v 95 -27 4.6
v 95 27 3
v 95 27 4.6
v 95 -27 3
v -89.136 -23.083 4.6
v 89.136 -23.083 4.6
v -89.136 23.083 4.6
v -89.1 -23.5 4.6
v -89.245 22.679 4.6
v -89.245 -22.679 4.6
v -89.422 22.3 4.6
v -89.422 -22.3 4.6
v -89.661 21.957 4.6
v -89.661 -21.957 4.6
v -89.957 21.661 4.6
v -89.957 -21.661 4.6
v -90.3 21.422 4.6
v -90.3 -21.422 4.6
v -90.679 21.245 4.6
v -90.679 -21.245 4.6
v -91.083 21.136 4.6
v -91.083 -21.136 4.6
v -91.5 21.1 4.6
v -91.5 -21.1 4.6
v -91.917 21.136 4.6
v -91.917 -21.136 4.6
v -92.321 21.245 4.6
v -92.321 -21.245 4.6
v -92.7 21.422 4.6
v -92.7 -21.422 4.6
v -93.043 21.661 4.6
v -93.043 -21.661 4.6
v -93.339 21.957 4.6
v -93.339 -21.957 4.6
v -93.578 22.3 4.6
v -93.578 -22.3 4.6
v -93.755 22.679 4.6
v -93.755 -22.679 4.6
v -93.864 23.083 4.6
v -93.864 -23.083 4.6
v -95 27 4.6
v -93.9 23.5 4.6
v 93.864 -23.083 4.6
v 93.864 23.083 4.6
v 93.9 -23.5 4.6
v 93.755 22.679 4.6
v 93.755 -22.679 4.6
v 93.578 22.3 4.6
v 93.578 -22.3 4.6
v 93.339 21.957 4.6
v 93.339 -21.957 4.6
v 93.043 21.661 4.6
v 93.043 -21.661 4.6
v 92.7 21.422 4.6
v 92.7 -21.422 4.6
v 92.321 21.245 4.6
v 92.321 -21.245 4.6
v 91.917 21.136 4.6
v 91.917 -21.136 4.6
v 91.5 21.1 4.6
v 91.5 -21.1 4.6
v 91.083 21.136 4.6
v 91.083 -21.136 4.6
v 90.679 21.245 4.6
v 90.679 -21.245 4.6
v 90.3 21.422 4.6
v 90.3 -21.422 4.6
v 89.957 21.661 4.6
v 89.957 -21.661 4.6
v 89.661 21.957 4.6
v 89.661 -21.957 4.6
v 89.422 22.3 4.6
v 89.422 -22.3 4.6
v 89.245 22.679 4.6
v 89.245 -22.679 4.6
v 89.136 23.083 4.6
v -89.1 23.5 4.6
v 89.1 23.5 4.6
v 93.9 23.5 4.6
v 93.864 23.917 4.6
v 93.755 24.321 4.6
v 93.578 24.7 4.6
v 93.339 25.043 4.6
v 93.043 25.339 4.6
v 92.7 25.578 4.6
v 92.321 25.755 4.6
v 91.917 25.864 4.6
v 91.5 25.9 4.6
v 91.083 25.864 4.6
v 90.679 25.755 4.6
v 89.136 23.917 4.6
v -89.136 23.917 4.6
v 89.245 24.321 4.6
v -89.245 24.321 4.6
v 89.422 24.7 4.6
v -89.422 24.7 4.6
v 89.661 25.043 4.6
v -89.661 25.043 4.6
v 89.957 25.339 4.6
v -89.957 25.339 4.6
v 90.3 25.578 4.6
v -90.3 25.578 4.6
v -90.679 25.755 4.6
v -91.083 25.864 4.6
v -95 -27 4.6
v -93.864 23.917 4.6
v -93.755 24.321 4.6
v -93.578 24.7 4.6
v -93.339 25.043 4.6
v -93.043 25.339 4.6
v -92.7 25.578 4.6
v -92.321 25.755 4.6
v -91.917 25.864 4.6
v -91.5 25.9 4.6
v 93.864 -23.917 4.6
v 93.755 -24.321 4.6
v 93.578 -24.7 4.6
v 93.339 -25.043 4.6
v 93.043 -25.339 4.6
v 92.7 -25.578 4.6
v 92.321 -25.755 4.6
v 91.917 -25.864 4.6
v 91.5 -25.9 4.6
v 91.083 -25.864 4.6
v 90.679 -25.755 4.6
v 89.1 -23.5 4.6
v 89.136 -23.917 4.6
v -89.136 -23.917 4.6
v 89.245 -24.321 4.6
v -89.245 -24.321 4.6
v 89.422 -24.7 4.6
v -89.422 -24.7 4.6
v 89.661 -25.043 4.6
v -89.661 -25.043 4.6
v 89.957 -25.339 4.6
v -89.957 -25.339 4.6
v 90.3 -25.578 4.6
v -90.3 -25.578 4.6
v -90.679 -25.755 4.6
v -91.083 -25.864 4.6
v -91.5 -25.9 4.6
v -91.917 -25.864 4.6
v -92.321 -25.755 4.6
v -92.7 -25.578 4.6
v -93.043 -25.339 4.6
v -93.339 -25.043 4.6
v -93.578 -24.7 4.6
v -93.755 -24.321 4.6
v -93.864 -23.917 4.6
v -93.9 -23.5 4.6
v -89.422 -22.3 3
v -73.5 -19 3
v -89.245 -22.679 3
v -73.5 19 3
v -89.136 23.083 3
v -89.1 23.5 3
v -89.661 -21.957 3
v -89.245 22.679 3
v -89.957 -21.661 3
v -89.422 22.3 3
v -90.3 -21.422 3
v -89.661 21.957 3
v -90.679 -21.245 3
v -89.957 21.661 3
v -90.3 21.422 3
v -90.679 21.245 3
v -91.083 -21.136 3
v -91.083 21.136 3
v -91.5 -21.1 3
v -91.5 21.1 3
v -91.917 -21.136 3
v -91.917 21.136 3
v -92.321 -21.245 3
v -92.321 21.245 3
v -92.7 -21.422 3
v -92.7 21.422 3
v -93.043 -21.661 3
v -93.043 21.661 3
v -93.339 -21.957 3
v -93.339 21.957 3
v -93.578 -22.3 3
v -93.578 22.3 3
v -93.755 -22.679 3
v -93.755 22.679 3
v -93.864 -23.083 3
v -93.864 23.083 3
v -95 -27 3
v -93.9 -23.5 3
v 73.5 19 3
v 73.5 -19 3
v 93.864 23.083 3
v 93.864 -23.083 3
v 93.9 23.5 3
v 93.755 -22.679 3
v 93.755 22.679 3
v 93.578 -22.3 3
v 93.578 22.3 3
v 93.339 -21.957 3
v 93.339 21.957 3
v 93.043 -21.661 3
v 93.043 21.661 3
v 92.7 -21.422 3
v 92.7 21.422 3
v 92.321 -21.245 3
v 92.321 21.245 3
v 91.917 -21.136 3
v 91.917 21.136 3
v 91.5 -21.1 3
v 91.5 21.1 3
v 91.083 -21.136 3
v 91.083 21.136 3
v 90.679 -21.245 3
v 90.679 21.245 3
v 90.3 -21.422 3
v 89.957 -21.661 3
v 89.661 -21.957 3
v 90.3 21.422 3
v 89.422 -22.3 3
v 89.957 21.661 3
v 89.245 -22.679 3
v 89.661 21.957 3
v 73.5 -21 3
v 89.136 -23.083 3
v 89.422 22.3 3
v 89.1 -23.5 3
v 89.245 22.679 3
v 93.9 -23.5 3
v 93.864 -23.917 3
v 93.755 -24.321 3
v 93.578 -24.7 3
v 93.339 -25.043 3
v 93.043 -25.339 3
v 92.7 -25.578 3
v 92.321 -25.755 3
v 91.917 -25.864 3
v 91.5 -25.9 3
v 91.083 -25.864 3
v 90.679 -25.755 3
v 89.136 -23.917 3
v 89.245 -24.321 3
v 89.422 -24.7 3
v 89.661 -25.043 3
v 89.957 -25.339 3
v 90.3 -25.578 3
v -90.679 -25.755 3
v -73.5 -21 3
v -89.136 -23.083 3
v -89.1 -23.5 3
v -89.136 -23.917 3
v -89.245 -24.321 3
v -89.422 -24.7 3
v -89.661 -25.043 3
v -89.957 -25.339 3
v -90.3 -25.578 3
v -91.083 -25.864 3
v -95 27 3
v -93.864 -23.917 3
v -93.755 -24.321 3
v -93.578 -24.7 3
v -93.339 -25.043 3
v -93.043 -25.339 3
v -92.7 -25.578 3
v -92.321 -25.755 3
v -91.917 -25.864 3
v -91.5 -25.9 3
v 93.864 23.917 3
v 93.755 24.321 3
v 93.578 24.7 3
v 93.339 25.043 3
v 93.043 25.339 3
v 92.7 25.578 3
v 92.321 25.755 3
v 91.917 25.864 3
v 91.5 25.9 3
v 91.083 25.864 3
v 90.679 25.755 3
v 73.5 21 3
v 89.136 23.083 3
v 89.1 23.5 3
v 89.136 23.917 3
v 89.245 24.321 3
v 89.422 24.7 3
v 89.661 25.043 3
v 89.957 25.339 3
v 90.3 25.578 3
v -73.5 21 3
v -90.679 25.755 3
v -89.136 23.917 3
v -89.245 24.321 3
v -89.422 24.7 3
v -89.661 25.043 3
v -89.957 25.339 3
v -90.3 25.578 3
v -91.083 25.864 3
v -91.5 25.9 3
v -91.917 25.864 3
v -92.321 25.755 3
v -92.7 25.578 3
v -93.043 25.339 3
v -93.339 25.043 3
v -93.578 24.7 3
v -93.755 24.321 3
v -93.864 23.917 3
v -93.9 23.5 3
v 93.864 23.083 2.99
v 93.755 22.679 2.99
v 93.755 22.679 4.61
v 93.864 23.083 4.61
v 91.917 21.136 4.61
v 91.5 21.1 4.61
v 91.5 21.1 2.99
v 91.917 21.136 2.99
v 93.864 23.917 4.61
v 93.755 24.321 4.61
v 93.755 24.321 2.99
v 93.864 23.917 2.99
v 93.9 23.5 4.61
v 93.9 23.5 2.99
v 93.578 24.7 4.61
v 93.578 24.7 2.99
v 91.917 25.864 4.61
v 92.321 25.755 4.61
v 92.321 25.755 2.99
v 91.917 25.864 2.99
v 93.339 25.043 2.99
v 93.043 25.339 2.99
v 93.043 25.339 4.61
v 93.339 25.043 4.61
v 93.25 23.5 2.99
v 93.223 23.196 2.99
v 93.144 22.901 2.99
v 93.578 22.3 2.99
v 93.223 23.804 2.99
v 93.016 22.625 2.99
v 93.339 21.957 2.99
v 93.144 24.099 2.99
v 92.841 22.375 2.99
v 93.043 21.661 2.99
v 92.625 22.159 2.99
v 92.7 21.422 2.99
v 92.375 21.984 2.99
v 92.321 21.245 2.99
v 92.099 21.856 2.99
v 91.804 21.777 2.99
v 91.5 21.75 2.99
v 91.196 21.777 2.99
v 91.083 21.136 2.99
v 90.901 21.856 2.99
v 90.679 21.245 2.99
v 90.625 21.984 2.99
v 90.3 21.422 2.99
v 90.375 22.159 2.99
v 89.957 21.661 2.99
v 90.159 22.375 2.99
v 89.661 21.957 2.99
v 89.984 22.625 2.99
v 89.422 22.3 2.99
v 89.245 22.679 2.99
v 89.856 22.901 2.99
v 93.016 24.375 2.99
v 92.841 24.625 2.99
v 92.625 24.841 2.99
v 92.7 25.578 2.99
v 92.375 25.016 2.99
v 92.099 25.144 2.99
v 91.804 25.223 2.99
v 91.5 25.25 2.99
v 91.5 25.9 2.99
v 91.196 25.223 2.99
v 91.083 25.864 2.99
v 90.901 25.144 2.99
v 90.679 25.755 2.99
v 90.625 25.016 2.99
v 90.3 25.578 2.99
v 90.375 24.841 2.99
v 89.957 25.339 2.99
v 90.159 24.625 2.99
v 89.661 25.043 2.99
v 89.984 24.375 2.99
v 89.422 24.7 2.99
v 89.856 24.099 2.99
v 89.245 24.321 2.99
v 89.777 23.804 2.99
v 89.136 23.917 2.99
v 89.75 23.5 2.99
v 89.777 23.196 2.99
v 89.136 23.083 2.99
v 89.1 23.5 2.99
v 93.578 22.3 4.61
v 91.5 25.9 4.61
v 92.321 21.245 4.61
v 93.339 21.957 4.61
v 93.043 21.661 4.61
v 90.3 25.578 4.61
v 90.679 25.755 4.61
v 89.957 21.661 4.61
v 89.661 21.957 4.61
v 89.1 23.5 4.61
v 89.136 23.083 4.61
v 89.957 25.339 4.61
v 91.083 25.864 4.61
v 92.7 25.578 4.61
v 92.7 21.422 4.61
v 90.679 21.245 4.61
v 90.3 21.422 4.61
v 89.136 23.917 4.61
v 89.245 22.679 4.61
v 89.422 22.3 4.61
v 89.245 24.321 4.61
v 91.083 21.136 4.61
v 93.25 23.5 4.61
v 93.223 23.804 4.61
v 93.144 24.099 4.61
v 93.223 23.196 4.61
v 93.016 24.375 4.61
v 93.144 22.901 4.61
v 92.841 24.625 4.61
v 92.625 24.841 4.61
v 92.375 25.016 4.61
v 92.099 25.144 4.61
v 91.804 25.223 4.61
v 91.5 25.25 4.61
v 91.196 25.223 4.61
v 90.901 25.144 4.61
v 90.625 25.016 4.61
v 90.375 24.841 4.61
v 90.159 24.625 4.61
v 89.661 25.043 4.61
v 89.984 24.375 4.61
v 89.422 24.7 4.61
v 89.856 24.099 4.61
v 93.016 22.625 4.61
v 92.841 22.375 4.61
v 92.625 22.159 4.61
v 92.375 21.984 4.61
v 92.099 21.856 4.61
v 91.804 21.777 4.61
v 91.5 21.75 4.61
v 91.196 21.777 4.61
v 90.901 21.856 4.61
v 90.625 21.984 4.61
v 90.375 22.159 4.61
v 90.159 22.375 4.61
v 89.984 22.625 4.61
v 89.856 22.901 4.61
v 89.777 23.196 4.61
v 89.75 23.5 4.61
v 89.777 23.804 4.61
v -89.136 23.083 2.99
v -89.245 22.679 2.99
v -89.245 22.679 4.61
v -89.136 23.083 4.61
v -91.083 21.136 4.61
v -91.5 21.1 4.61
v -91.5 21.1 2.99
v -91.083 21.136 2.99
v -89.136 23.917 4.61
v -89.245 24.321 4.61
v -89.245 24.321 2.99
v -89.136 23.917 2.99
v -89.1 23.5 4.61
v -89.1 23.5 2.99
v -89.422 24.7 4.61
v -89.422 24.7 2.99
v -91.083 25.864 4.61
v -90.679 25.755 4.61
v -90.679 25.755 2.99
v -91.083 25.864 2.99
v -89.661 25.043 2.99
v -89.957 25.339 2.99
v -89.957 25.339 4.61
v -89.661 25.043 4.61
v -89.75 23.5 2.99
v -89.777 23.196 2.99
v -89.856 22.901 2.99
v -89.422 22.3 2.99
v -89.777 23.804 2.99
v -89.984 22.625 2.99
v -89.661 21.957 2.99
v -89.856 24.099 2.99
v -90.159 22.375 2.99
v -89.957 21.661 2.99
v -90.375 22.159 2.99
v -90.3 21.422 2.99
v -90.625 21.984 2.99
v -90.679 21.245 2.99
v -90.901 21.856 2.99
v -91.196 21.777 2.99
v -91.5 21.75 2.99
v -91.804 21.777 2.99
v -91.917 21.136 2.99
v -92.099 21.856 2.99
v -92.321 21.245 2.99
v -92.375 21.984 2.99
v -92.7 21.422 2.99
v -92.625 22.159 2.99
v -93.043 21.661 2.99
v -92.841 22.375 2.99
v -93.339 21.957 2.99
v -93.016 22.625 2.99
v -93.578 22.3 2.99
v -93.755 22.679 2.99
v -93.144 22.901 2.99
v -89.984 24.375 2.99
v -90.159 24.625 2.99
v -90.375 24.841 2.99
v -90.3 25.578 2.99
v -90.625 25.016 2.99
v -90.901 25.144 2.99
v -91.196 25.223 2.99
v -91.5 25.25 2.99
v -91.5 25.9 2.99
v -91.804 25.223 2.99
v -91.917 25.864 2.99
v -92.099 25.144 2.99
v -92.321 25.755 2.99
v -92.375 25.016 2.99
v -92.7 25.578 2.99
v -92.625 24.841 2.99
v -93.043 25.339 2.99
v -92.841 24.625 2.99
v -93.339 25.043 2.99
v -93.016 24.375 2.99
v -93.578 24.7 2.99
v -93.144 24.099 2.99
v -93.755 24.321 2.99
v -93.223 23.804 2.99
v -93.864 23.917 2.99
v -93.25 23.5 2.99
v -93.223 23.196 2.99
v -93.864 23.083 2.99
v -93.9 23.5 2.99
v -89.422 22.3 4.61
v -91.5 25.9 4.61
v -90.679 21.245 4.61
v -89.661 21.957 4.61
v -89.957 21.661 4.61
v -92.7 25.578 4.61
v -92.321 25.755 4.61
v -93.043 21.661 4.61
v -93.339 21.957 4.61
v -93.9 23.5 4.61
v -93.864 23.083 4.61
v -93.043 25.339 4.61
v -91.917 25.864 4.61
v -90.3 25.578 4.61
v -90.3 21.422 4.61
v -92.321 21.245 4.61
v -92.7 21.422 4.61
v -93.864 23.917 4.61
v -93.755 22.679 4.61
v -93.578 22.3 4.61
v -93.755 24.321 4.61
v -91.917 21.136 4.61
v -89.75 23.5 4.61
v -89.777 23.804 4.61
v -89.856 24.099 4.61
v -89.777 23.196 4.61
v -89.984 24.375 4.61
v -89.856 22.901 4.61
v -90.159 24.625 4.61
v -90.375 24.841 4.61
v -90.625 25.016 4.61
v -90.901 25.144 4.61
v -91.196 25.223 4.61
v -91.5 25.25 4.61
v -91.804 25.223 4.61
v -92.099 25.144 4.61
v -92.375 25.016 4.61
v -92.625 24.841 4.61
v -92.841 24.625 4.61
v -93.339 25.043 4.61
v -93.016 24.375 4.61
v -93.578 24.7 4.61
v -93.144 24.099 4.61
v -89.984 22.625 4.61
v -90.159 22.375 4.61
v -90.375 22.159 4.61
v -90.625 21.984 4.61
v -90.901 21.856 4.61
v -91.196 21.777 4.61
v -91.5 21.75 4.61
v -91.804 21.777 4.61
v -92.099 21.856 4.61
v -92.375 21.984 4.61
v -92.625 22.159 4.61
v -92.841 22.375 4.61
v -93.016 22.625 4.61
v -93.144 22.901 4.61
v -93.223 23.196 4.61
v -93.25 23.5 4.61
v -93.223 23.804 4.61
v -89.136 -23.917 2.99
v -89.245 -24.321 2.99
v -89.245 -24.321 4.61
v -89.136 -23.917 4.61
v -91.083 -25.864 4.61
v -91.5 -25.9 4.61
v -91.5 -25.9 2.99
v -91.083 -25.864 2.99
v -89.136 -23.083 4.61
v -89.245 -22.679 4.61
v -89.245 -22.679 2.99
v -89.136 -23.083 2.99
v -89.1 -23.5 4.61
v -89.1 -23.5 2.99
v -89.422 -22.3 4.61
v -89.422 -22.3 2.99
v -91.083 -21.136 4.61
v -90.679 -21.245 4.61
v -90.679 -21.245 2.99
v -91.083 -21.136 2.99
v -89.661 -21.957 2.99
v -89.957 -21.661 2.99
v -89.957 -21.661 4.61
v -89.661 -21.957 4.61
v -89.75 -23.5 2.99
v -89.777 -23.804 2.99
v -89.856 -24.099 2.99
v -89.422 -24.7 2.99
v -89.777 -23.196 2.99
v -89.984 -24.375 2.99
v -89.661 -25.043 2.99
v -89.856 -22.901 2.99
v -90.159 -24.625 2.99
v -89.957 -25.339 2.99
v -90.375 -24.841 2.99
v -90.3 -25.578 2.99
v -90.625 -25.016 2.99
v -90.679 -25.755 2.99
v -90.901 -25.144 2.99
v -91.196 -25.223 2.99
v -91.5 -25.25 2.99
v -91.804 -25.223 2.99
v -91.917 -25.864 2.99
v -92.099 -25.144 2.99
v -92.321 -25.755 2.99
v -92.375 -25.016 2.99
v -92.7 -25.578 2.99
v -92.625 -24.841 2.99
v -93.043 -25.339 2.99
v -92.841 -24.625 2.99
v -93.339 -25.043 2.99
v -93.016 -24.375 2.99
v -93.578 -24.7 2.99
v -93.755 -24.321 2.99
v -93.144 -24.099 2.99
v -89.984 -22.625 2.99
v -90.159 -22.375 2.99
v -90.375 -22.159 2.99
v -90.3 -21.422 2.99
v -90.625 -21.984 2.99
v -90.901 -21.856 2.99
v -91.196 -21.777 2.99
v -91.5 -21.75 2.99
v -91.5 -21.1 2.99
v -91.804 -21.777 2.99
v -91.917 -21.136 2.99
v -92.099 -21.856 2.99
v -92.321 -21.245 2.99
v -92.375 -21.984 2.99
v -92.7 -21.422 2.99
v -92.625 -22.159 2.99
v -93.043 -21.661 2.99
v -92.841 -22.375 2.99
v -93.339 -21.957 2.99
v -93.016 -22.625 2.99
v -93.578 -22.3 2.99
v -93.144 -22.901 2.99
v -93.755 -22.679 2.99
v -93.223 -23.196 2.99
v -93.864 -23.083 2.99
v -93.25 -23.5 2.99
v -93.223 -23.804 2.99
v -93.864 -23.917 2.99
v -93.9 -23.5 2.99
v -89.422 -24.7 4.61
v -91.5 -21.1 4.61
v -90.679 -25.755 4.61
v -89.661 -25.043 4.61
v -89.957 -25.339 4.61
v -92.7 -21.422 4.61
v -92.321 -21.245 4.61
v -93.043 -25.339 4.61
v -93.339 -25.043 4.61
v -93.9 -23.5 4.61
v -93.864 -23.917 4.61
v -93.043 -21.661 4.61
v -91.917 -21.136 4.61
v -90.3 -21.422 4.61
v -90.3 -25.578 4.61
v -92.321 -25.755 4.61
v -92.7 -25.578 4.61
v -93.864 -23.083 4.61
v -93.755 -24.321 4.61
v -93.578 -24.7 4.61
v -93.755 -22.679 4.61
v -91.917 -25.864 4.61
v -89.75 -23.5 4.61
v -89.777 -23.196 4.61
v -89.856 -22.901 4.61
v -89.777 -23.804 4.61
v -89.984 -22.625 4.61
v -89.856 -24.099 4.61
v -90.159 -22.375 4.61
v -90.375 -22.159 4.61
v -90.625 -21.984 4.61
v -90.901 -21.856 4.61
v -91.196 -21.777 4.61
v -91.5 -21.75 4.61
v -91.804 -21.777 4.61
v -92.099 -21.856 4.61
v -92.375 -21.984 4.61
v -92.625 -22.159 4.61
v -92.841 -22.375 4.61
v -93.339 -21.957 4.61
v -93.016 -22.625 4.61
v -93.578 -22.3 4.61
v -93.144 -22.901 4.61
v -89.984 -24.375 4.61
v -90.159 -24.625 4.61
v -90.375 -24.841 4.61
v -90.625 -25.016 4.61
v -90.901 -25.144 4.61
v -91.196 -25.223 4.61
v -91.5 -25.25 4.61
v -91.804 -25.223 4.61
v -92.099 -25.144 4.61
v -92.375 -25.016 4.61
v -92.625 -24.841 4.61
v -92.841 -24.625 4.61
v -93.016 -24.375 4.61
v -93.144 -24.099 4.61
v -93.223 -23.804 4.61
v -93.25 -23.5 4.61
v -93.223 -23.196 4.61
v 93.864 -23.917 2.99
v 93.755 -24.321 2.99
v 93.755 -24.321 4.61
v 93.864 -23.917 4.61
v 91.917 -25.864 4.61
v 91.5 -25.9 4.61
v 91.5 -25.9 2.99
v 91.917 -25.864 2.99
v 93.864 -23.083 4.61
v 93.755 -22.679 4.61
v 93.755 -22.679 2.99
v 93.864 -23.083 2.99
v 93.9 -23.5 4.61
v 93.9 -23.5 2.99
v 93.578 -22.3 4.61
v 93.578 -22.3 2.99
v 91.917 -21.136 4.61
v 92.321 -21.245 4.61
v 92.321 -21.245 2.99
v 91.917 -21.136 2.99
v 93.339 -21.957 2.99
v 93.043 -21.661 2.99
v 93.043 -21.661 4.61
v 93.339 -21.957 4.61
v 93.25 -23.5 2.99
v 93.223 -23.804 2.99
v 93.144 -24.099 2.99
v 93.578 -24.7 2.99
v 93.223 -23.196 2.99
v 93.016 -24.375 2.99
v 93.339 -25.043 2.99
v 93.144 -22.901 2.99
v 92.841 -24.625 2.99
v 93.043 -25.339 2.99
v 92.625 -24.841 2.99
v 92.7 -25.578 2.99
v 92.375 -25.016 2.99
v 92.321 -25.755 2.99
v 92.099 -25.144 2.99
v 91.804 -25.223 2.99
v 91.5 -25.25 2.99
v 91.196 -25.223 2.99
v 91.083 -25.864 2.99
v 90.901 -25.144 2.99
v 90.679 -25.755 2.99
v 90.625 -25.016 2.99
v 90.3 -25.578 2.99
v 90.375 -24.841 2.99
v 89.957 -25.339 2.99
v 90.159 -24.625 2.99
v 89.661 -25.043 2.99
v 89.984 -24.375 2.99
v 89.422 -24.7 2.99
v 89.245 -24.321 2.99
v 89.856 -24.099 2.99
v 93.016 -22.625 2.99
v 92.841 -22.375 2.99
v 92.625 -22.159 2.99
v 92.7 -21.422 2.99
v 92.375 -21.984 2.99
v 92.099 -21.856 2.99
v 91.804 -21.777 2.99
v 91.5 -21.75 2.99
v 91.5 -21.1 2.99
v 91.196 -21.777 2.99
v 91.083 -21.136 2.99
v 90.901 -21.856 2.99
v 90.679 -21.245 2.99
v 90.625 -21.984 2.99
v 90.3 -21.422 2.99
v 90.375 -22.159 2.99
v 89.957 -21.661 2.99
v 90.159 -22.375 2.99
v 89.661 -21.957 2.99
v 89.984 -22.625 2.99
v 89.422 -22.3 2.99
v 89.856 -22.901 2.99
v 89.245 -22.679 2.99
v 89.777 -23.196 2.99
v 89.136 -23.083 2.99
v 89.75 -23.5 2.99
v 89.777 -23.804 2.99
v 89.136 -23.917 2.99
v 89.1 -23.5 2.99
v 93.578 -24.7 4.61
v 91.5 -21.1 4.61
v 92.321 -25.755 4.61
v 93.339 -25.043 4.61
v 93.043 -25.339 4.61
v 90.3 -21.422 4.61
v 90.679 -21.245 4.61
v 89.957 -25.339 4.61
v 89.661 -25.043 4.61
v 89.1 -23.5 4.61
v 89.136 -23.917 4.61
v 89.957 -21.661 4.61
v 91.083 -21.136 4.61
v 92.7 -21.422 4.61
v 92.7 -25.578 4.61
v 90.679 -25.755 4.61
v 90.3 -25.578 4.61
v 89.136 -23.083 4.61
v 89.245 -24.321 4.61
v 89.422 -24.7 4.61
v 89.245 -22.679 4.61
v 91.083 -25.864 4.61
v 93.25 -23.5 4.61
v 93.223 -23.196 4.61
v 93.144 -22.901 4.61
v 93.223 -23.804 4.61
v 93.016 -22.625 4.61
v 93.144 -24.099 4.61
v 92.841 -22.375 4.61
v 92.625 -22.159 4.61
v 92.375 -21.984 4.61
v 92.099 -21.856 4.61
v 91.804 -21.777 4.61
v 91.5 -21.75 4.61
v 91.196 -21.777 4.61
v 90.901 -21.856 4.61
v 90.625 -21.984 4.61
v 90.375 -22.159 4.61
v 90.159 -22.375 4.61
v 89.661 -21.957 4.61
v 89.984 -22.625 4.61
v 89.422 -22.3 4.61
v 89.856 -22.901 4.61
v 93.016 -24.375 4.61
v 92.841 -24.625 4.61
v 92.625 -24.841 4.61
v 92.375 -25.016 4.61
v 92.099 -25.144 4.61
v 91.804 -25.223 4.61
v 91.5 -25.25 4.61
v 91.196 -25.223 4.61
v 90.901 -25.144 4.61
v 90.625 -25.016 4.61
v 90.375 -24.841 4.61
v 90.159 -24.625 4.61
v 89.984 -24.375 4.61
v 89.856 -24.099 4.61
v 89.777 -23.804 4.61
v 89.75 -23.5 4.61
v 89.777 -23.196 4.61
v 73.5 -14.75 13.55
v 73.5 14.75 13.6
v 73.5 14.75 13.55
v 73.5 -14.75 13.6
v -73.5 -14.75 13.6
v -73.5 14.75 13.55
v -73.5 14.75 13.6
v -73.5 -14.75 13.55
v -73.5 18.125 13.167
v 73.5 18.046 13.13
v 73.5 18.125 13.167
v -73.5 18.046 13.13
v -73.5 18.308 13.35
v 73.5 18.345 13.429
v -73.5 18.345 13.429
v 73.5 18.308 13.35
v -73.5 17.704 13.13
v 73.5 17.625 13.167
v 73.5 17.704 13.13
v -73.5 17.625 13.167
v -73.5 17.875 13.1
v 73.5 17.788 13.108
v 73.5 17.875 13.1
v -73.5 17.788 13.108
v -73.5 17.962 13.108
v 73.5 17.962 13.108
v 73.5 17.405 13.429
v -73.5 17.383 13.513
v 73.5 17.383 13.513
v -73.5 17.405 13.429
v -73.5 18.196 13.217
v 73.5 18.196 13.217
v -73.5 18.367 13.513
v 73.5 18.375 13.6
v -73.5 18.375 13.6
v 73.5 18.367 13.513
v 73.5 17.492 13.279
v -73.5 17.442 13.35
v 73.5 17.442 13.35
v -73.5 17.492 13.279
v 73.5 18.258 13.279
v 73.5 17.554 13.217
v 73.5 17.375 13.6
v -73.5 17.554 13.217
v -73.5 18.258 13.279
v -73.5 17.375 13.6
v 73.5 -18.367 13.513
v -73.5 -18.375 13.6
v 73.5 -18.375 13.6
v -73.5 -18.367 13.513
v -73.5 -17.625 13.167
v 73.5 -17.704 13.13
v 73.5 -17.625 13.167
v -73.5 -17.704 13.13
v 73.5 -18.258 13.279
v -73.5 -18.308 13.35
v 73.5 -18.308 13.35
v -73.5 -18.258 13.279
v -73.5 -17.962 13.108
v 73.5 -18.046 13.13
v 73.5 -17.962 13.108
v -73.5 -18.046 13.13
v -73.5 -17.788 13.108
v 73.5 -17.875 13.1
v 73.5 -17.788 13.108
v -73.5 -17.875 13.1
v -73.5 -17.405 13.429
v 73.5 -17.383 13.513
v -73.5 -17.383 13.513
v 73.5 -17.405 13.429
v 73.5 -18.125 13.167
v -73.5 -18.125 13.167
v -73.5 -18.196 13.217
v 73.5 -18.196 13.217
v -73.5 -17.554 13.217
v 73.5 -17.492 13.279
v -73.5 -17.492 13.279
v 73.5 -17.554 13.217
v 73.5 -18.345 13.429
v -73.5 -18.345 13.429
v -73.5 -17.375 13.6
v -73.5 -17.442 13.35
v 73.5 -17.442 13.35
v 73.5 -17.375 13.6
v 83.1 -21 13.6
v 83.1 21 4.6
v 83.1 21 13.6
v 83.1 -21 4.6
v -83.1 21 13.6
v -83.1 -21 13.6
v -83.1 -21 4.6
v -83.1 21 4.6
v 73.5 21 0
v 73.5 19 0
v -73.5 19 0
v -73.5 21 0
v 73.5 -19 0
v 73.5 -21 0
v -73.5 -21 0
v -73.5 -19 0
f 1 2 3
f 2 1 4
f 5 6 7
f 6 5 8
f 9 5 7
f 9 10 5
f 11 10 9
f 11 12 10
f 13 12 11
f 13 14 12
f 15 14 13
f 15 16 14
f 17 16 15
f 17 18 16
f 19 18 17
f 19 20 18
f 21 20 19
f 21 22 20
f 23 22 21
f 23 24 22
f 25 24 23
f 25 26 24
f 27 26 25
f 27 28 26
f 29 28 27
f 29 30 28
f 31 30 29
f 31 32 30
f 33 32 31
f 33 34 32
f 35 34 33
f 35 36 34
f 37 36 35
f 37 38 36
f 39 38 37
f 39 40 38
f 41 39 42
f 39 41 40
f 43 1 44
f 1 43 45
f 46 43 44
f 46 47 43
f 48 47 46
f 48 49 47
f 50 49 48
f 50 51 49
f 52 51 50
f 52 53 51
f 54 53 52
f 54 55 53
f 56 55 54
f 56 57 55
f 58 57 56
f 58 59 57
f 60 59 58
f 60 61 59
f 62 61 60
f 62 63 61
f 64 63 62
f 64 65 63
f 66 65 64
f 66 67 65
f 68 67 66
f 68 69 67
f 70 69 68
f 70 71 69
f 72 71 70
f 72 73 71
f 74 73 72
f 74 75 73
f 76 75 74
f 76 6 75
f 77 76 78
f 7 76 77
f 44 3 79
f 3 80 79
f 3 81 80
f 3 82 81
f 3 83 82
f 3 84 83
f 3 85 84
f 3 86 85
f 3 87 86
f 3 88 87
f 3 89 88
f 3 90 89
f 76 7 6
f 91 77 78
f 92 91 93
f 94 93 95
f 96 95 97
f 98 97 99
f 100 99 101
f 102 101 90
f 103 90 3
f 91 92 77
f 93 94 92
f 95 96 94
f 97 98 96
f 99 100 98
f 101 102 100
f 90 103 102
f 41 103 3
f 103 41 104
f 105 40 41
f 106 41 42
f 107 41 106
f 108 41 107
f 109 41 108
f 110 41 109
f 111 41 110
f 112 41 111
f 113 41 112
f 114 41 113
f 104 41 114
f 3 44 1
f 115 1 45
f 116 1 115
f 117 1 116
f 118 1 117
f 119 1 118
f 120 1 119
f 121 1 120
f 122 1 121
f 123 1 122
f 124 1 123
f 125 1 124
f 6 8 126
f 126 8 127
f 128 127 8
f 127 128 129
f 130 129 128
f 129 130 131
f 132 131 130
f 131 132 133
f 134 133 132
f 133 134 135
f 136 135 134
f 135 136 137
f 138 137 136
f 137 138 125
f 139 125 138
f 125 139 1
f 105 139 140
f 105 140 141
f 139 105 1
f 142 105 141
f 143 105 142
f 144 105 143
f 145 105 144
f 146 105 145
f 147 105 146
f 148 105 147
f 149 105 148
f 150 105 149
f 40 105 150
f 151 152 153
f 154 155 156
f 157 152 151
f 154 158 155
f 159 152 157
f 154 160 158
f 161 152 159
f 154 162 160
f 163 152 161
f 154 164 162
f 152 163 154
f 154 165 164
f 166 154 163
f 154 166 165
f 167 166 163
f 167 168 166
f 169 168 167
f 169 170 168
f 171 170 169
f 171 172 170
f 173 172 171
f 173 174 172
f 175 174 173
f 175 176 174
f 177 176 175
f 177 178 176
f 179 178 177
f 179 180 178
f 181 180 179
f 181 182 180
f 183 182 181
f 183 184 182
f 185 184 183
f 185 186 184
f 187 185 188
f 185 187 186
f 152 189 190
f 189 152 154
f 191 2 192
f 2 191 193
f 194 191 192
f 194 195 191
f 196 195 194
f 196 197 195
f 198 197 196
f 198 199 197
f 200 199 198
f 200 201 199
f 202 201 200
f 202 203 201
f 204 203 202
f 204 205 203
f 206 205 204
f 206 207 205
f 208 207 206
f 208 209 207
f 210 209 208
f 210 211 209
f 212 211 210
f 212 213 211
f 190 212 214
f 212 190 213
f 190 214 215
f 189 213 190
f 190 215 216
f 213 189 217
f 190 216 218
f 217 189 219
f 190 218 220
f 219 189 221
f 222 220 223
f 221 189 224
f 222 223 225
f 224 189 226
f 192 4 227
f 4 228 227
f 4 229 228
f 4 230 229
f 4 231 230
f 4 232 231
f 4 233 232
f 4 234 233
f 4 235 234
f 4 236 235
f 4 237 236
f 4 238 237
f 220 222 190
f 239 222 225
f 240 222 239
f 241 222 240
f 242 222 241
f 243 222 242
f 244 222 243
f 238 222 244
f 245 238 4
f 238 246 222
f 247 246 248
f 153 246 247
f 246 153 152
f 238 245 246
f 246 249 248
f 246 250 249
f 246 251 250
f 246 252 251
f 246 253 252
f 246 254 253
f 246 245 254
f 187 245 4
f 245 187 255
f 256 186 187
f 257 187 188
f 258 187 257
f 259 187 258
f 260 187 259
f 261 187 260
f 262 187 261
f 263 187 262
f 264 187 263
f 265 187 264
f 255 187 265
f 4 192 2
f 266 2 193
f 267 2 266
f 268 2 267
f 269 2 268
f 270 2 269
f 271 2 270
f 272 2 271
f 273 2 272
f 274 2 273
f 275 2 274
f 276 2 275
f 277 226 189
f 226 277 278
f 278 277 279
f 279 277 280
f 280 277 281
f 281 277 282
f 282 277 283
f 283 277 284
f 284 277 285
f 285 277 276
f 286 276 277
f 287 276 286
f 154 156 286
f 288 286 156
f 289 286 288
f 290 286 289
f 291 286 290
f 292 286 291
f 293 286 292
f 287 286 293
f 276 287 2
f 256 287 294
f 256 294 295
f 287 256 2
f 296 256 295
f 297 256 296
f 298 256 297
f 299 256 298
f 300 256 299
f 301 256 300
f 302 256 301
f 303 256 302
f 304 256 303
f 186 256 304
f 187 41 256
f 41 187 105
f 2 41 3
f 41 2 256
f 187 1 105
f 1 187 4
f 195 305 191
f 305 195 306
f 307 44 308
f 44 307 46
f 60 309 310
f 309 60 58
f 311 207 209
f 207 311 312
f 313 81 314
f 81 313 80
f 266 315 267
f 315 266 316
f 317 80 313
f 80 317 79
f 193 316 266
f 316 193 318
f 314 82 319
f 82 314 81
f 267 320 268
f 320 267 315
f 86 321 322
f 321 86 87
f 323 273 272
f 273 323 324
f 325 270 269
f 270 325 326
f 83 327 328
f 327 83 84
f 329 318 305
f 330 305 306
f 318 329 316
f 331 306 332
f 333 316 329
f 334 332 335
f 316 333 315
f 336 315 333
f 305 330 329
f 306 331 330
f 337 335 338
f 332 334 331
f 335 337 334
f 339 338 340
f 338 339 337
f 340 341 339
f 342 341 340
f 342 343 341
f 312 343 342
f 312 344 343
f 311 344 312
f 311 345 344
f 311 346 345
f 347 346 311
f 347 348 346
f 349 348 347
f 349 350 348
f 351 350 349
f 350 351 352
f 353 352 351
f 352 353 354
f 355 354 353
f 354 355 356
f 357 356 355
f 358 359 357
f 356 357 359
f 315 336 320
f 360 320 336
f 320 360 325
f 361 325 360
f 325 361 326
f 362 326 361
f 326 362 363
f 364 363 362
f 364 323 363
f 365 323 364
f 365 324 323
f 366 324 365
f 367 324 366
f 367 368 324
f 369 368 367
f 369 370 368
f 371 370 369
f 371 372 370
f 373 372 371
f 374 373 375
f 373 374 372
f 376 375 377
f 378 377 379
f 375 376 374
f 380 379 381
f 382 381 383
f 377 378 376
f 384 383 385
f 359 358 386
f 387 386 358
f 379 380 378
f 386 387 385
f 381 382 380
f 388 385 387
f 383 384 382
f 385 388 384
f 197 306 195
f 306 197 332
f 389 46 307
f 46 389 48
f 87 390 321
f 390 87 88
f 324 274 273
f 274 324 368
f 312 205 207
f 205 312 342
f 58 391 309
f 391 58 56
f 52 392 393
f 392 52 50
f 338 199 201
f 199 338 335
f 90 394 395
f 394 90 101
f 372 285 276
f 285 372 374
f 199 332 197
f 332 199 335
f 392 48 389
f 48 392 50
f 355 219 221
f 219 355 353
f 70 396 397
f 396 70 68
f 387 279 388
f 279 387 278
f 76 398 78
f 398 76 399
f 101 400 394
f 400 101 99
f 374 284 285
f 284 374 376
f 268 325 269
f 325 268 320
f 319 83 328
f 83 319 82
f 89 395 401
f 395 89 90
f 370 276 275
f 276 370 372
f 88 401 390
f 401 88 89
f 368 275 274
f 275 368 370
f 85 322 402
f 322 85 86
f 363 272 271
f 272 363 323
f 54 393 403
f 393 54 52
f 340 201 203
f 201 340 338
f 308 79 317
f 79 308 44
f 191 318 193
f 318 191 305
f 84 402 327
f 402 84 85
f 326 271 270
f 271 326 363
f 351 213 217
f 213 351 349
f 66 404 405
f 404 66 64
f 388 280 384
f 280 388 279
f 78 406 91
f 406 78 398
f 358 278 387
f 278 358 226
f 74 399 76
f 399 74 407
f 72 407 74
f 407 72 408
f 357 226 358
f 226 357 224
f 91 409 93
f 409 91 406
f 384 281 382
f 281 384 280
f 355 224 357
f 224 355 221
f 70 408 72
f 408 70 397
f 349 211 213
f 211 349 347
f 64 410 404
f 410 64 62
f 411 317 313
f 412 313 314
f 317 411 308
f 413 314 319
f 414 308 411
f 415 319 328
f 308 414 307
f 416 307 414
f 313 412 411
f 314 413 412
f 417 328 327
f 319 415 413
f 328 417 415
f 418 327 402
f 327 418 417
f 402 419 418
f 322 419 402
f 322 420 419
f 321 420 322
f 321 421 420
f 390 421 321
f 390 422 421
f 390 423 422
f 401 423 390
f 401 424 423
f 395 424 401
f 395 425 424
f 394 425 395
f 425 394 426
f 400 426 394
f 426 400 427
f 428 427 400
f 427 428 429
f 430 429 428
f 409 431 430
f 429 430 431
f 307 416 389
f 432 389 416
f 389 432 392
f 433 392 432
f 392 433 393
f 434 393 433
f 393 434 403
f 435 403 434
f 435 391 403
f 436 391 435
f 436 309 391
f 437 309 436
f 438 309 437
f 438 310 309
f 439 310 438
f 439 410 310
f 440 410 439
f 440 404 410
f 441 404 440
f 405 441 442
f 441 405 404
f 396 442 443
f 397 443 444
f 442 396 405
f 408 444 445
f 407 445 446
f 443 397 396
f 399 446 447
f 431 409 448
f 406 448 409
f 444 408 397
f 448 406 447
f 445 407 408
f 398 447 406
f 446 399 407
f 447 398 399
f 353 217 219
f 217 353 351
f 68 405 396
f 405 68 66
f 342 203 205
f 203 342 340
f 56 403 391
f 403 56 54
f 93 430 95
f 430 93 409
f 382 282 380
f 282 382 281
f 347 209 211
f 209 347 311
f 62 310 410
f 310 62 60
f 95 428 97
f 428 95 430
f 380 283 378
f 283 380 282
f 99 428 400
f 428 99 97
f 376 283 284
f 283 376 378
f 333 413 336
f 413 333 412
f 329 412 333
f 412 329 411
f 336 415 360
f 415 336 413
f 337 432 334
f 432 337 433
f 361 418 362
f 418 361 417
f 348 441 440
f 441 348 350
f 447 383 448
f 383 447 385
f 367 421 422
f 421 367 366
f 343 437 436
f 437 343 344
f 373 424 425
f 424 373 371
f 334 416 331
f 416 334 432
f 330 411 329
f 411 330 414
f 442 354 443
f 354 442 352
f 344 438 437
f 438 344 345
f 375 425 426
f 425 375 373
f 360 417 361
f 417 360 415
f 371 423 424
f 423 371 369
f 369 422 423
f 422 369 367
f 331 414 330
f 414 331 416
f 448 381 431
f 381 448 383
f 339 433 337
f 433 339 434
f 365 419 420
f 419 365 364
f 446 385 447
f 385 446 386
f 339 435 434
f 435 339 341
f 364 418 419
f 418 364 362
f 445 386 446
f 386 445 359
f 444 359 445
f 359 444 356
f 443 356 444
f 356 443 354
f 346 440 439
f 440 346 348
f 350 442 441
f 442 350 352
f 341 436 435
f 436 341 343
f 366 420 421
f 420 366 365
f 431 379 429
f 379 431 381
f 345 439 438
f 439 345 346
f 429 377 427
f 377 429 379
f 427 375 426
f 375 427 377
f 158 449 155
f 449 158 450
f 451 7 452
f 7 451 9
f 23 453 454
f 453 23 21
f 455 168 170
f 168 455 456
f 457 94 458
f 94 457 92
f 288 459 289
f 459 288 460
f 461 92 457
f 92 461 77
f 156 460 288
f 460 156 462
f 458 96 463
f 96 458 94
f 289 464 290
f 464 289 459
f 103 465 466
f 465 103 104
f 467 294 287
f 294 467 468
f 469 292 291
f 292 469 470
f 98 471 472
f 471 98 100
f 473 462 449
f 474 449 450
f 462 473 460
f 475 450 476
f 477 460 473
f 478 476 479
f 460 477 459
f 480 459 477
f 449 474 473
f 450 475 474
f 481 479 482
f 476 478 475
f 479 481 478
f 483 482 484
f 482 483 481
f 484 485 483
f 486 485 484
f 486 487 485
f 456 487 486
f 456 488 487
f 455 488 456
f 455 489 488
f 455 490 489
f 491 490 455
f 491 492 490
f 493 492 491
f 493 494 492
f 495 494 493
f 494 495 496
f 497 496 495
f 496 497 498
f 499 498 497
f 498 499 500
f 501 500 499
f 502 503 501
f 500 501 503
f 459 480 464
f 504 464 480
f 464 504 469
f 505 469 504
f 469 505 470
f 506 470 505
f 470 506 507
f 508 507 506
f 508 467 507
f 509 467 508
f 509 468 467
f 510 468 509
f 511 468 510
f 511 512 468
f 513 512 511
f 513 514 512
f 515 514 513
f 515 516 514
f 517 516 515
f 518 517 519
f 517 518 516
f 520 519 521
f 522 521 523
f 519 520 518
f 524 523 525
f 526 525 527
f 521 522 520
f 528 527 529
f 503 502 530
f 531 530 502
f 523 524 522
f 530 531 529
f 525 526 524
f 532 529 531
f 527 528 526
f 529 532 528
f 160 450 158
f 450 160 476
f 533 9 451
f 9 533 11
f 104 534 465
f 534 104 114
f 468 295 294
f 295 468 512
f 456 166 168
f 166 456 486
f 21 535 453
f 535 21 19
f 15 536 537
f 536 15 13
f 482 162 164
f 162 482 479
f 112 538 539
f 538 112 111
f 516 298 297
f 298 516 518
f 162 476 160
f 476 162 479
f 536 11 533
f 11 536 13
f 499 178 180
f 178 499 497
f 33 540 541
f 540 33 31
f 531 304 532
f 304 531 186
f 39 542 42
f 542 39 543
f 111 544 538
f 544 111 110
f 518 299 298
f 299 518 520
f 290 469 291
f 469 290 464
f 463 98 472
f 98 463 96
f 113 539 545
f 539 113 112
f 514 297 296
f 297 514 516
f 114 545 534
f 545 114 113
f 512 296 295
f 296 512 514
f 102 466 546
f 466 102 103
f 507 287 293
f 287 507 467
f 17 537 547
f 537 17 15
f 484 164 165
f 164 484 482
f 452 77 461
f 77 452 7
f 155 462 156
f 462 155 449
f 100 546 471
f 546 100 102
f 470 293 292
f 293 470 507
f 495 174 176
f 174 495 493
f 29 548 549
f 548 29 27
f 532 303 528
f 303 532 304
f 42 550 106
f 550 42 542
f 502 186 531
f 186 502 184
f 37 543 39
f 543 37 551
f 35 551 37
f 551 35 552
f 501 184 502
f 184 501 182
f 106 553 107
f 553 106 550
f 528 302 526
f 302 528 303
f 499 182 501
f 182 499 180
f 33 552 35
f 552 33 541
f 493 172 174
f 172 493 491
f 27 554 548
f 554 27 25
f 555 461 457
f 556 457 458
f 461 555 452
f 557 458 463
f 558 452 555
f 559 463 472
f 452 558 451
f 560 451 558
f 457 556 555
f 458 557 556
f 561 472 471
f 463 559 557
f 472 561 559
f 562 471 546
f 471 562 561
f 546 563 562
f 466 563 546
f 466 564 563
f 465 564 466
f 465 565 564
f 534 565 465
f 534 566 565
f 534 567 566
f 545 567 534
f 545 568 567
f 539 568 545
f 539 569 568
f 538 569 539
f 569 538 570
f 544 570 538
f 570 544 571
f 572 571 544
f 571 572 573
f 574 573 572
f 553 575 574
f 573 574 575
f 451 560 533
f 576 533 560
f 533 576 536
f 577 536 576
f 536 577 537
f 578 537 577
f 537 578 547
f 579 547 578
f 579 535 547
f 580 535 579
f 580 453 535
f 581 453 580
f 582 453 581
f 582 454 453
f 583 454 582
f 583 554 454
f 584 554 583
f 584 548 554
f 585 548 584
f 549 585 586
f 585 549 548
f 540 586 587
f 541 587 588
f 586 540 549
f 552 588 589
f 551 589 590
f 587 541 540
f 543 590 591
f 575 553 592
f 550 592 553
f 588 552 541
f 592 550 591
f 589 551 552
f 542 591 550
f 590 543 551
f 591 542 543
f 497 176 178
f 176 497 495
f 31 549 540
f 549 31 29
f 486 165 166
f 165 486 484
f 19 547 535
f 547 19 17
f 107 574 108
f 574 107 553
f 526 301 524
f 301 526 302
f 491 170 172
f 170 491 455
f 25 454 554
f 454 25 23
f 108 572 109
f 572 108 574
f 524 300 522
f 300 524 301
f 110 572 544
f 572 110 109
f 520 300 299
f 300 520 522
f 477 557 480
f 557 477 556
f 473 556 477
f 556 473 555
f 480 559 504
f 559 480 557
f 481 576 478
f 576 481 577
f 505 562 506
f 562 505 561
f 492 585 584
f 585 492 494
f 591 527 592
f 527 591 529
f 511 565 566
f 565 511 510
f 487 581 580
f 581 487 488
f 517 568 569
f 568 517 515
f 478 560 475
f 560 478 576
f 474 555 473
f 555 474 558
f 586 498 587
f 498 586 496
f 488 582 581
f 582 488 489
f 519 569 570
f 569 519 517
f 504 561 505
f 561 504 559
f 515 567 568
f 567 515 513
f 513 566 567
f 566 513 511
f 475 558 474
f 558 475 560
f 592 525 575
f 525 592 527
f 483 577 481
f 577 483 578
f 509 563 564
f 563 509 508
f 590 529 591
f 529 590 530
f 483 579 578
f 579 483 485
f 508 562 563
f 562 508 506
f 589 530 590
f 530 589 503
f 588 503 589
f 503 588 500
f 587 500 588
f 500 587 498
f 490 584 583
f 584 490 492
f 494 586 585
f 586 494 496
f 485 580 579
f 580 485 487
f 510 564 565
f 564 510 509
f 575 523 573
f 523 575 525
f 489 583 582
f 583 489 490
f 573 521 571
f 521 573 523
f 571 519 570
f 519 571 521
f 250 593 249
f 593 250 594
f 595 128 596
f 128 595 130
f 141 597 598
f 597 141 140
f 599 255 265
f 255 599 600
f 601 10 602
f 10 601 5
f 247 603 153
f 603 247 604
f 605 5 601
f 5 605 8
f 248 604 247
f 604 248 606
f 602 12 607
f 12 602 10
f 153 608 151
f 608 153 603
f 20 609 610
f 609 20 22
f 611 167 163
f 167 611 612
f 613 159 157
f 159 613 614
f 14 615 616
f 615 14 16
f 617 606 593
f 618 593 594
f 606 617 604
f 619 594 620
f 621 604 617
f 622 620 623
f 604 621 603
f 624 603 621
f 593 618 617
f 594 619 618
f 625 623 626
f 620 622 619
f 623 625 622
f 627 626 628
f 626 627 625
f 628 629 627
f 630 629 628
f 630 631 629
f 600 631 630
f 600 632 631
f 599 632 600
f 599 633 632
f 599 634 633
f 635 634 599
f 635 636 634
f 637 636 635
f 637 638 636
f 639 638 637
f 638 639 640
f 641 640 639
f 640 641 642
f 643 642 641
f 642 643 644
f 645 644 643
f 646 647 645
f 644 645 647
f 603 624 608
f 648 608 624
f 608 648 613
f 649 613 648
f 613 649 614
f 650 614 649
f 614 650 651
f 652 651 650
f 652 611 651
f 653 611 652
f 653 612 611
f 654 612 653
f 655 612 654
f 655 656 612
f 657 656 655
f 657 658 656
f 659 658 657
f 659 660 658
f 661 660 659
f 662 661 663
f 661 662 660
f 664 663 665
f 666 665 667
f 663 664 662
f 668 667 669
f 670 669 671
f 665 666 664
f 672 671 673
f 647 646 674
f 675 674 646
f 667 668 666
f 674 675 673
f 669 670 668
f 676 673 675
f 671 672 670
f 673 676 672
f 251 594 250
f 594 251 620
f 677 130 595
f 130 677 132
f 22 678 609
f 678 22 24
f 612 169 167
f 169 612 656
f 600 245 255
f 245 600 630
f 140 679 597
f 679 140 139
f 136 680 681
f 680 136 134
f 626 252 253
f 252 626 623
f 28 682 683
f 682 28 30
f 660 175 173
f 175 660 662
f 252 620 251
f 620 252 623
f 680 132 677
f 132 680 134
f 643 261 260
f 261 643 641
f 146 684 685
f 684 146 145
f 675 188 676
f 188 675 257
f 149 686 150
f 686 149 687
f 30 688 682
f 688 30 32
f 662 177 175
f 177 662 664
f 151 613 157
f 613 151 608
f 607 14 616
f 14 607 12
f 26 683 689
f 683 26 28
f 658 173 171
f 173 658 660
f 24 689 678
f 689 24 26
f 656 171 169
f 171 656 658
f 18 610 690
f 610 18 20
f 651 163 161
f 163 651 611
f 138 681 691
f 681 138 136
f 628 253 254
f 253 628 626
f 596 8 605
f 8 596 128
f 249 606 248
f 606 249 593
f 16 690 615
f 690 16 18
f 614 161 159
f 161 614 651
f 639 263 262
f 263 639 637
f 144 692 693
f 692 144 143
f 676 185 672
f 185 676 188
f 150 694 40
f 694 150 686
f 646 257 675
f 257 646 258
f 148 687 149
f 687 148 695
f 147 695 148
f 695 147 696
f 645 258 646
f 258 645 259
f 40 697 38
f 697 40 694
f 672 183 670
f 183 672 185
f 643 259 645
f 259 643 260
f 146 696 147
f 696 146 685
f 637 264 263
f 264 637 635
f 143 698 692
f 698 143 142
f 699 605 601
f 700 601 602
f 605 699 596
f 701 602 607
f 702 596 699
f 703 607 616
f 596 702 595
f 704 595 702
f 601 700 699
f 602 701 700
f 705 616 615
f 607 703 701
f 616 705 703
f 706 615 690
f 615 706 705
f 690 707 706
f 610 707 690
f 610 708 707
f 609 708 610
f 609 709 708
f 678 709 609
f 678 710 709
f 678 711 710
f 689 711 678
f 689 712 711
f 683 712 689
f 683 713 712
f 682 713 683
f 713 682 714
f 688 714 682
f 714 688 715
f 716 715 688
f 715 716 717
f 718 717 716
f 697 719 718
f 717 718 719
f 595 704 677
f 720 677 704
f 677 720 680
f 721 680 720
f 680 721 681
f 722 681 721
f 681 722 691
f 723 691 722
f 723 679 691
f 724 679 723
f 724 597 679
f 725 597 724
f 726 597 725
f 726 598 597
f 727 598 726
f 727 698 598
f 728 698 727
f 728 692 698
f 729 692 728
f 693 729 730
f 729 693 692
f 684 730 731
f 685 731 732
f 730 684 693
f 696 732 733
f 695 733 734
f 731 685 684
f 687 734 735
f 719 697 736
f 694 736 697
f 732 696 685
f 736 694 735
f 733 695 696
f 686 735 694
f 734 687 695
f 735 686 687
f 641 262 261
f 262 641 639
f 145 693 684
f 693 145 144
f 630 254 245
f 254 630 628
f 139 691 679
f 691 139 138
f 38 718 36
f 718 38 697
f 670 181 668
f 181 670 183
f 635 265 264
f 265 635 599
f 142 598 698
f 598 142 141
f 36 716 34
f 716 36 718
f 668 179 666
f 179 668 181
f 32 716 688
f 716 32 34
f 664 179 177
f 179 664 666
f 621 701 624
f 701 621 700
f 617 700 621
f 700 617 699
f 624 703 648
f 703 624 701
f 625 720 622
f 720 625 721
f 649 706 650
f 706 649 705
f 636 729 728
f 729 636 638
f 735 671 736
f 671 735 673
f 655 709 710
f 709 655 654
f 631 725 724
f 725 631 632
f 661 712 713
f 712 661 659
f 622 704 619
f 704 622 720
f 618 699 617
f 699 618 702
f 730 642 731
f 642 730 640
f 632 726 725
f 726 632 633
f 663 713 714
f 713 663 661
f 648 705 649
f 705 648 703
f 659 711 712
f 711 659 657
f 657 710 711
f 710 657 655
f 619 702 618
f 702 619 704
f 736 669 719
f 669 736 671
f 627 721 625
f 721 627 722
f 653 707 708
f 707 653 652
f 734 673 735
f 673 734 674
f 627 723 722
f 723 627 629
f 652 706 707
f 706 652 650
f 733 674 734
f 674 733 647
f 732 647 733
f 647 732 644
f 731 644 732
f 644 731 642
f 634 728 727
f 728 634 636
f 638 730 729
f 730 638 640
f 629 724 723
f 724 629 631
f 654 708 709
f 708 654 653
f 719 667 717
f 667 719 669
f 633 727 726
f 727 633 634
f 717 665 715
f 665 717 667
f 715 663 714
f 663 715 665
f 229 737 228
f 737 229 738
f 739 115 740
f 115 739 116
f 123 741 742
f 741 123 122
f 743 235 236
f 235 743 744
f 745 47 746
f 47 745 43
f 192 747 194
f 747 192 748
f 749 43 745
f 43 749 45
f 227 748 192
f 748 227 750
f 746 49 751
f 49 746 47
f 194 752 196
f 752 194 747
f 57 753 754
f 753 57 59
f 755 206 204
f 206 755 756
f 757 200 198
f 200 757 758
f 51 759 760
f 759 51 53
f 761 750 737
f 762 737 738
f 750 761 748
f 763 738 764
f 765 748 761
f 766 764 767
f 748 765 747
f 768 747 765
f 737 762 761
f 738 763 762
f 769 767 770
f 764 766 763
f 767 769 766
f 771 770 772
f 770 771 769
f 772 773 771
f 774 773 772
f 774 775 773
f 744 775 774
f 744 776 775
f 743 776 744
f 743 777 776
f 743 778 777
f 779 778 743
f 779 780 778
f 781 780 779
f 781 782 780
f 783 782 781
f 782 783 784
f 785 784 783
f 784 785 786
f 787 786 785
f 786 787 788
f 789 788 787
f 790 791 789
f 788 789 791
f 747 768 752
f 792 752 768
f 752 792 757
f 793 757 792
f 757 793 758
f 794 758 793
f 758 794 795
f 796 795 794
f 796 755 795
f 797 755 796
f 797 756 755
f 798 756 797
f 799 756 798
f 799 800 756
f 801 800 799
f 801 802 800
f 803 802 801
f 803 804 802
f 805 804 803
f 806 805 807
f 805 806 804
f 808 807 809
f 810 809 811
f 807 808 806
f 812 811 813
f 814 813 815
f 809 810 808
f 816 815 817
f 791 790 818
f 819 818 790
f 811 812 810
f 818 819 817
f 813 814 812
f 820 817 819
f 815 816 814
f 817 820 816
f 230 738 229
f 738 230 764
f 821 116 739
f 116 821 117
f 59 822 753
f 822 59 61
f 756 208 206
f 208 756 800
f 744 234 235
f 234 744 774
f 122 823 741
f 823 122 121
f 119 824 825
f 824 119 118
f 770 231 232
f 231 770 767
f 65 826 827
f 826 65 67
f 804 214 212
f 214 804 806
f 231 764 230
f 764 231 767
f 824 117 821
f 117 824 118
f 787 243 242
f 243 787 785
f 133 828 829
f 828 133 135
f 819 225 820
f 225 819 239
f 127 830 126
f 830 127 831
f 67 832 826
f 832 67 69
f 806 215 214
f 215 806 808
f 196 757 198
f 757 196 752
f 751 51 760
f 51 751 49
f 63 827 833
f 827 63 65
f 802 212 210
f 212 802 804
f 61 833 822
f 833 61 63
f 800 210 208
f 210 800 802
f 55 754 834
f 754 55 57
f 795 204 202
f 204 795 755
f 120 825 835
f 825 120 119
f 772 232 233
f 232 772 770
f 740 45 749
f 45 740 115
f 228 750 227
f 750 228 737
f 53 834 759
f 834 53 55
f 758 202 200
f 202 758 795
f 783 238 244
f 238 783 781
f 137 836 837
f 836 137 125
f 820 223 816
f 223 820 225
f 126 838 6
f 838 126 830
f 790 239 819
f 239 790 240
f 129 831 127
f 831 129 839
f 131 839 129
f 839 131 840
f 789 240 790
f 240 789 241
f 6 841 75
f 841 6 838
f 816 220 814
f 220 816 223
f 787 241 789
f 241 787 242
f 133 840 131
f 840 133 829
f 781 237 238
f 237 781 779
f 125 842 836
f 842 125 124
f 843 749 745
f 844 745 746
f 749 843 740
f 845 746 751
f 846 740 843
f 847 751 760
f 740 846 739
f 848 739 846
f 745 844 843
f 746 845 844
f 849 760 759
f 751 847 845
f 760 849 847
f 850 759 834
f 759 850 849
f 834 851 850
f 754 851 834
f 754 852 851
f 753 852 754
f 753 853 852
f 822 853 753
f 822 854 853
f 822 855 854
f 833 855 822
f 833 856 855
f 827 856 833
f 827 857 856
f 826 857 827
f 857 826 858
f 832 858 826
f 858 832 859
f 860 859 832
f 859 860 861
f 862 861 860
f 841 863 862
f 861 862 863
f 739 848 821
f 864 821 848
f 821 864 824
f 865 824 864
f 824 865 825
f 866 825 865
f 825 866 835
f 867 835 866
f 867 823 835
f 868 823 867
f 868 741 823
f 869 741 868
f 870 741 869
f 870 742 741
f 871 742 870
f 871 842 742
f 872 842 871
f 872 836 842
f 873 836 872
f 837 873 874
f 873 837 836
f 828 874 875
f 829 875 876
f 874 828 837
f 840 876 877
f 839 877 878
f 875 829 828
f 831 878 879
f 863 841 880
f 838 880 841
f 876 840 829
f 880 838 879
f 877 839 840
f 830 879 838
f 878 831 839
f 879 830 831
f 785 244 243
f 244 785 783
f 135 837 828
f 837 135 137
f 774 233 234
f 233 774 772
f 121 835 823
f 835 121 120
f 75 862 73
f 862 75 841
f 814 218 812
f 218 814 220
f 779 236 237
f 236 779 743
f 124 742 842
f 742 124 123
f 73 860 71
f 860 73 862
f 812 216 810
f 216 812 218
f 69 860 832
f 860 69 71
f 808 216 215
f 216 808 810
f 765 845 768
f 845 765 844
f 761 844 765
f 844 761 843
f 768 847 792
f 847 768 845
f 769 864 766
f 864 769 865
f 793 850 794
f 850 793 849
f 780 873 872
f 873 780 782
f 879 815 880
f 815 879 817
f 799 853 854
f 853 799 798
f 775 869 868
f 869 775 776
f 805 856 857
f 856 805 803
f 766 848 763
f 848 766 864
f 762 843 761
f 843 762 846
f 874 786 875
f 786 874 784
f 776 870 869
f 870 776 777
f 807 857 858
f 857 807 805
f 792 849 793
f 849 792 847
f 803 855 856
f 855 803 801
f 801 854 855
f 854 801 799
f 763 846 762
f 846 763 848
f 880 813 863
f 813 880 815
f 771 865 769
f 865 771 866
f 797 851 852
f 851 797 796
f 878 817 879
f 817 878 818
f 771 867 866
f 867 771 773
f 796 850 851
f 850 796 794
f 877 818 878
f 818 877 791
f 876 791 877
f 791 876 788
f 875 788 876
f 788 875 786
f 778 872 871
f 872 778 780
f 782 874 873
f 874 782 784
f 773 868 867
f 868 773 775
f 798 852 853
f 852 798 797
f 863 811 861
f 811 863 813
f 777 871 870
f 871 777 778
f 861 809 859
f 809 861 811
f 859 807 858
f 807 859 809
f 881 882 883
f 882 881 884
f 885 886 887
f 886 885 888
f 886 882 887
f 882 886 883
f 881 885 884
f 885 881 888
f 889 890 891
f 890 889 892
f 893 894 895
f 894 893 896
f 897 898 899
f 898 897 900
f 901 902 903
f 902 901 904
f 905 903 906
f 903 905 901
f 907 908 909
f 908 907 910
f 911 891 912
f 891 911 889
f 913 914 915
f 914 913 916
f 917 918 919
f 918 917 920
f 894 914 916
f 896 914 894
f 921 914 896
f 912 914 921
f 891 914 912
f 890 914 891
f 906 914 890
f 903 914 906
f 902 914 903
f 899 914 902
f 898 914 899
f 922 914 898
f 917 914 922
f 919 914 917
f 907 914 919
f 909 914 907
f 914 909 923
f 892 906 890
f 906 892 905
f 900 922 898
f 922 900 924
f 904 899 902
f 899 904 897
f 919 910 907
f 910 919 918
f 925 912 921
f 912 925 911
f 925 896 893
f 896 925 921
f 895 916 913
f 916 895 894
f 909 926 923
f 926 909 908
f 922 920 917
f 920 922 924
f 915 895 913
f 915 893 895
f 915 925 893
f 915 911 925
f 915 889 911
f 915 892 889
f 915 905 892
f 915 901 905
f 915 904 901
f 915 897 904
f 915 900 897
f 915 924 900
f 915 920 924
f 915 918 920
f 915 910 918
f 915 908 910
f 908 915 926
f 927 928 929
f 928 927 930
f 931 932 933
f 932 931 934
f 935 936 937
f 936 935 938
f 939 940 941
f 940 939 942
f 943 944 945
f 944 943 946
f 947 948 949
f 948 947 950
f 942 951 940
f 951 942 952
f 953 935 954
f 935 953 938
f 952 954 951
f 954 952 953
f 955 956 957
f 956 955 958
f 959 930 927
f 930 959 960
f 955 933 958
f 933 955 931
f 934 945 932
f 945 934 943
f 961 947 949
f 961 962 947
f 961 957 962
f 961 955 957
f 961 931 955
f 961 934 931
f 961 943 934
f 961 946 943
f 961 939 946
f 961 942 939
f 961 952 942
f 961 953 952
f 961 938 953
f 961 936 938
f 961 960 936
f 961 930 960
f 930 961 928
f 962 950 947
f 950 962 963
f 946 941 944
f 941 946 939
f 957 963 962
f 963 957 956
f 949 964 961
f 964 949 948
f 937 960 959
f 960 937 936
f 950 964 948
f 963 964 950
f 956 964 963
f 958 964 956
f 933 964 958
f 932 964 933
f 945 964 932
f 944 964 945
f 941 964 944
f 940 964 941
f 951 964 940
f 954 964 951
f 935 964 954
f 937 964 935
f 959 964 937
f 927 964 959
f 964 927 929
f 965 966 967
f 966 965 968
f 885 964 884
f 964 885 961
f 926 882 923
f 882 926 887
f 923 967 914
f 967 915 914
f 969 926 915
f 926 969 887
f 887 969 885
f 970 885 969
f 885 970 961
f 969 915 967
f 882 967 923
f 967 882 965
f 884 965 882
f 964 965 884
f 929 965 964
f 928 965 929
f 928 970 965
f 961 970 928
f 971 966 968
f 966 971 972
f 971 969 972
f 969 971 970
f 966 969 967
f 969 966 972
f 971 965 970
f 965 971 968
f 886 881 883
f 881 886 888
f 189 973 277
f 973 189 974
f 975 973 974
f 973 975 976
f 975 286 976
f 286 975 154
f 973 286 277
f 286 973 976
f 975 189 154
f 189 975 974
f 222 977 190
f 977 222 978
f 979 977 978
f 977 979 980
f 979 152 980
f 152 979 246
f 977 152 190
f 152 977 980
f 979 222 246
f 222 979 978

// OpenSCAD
// file: proto/lcd_module.scad
/*
OpenSCAD Model:  LCD module

Parameters:
  W   - module width
  H   - module height
  t   - DPS thickness
  BW  - display body width
  BH  - display body height
  DW  - display area width
  DH  - display area height
  th  - total height
  dh  - distance from module botom  to top of DPS
  cpd - corner hole copper diameter
  chd - corner hole diameter
  cx  - horizontal distance of corner holes
  cy  - vertical distance of corner holes
  px  - distance of 1st pad center from left
  py  - distance of 1st pad center from yop
  ppd - connection pad diameter
  phd - connection pad hole diameter
  pdt - connection pads pitch
  n   - number of connection pads
*/

module lcd_module (
		W=80,
		H=36,
		t=1.76,
		BW=71.2,
		BH=26.2,
		DW=66,
		DH=16,
		th=8.9,
		dh=4.8,
		cpd=5,
		chd=2.5,
		cx=75,
		cy=31,
		px=8,
		py=2,
		ppd=2,
		phd=1,
		pdt=2.54,
		n=16
	) {
	module cpad(tr) {
		color ([1,1,0]) translate (tr) difference () {
			cylinder(r=cpd/2-0.1,h=t+0.02,center=true,$fn=36);
			cylinder(r=chd/2,h=t+0.2,center=true,$fn=36);
		}
	}

	module pad(tr) {
		color ([1,1,0]) translate (tr) difference () {
			union () {
				translate([0,(py-0.1)/2,0]) cube([ppd,py-0.1,t+0.02],center=true);
				cylinder(r=ppd/2,h=t+0.02,center=true,$fn=36);
			}
			cylinder(r=phd/2,h=t+0.2,center=true,$fn=36);
		}
	}

	translate([0,0,(th-dh)-t/2]) union () {
		color ([0,0.5,0])  difference () {
			cube([W,H,t],center=true);
			union () {
				translate([cx/2,cy/2,0]) cylinder(r=chd/2+0.1,h=t+0.2,center=true,$fn=36);
				translate([-cx/2,cy/2,0]) cylinder(r=chd/2+0.1,h=t+0.2,center=true,$fn=36);
				translate([-cx/2,-cy/2,0]) cylinder(r=chd/2+0.1,h=t+0.2,center=true,$fn=36);
				translate([cx/2,-cy/2,0]) cylinder(r=chd/2+0.1,h=t+0.2,center=true,$fn=36);
				if (n>0) {for (i=[1:n]) {
					translate([-W/2+px+(i-1)*pdt,H/2-py,0]) cylinder(r=(phd/2)+0.1,h=t+0.2,center=true,$fn=36);
				}}
			}
		}
		cpad([cx/2,cy/2,0]);
		cpad([-cx/2,cy/2,0]);
		cpad([-cx/2,-cy/2,0]);
		cpad([cx/2,-cy/2,0]);
		if (n>0) { for (i=[1:n]) {
			pad([-W/2+px+(i-1)*pdt,H/2-py,0]);
		}}
		color ([0.9,0.9,0.9]) translate ([0,0,dh/2+t/2])
		difference () {
		 cube([BW,BH,dh],center=true);
			union () {
				translate([0,0,dh/2-0.45]) cube([DW,DH,1],center=true);
				translate([0,(DH+BH)/4,dh/2]) rotate(90,[0,1,0]) cylinder(r=0.5,h=DW,center=true,$fn=36);
				translate([0,-(DH+BH)/4,dh/2]) rotate(90,[0,1,0]) cylinder(r=0.5,h=DW,center=true,$fn=36);
			}
		}
		color ([0.2,0.3,0])  translate([0,0,dh+t/2-0.55]) cube([DW,DH,1],center=true);
		color ([0,0,0]) translate ([0,BH/2-1,-((th-dh)-t)/2-t/2]) cube([DW,2,((th-dh)-t)],center=true);
		color ([0,0,0]) translate ([0,-(BH/2-1),-((th-dh)-t)/2-t/2]) cube([DW,2,((th-dh)-t)],center=true);
	}
}
// main file
include <proto/lcd_module.scad>

lcd_module(
		W=190,
		H=54,
		t=1.6,
		BW=166.2,
		BH=42,
		DW=147,
		DH=29.5,
		th=13.6,
		dh=9.0,
		cpd=5,
		chd=3.5,
		cx=183,
		cy=47,
		px=10,
		py=2.5,
		ppd=2,
		phd=1,
		pdt=2.54,
		n=0
);
